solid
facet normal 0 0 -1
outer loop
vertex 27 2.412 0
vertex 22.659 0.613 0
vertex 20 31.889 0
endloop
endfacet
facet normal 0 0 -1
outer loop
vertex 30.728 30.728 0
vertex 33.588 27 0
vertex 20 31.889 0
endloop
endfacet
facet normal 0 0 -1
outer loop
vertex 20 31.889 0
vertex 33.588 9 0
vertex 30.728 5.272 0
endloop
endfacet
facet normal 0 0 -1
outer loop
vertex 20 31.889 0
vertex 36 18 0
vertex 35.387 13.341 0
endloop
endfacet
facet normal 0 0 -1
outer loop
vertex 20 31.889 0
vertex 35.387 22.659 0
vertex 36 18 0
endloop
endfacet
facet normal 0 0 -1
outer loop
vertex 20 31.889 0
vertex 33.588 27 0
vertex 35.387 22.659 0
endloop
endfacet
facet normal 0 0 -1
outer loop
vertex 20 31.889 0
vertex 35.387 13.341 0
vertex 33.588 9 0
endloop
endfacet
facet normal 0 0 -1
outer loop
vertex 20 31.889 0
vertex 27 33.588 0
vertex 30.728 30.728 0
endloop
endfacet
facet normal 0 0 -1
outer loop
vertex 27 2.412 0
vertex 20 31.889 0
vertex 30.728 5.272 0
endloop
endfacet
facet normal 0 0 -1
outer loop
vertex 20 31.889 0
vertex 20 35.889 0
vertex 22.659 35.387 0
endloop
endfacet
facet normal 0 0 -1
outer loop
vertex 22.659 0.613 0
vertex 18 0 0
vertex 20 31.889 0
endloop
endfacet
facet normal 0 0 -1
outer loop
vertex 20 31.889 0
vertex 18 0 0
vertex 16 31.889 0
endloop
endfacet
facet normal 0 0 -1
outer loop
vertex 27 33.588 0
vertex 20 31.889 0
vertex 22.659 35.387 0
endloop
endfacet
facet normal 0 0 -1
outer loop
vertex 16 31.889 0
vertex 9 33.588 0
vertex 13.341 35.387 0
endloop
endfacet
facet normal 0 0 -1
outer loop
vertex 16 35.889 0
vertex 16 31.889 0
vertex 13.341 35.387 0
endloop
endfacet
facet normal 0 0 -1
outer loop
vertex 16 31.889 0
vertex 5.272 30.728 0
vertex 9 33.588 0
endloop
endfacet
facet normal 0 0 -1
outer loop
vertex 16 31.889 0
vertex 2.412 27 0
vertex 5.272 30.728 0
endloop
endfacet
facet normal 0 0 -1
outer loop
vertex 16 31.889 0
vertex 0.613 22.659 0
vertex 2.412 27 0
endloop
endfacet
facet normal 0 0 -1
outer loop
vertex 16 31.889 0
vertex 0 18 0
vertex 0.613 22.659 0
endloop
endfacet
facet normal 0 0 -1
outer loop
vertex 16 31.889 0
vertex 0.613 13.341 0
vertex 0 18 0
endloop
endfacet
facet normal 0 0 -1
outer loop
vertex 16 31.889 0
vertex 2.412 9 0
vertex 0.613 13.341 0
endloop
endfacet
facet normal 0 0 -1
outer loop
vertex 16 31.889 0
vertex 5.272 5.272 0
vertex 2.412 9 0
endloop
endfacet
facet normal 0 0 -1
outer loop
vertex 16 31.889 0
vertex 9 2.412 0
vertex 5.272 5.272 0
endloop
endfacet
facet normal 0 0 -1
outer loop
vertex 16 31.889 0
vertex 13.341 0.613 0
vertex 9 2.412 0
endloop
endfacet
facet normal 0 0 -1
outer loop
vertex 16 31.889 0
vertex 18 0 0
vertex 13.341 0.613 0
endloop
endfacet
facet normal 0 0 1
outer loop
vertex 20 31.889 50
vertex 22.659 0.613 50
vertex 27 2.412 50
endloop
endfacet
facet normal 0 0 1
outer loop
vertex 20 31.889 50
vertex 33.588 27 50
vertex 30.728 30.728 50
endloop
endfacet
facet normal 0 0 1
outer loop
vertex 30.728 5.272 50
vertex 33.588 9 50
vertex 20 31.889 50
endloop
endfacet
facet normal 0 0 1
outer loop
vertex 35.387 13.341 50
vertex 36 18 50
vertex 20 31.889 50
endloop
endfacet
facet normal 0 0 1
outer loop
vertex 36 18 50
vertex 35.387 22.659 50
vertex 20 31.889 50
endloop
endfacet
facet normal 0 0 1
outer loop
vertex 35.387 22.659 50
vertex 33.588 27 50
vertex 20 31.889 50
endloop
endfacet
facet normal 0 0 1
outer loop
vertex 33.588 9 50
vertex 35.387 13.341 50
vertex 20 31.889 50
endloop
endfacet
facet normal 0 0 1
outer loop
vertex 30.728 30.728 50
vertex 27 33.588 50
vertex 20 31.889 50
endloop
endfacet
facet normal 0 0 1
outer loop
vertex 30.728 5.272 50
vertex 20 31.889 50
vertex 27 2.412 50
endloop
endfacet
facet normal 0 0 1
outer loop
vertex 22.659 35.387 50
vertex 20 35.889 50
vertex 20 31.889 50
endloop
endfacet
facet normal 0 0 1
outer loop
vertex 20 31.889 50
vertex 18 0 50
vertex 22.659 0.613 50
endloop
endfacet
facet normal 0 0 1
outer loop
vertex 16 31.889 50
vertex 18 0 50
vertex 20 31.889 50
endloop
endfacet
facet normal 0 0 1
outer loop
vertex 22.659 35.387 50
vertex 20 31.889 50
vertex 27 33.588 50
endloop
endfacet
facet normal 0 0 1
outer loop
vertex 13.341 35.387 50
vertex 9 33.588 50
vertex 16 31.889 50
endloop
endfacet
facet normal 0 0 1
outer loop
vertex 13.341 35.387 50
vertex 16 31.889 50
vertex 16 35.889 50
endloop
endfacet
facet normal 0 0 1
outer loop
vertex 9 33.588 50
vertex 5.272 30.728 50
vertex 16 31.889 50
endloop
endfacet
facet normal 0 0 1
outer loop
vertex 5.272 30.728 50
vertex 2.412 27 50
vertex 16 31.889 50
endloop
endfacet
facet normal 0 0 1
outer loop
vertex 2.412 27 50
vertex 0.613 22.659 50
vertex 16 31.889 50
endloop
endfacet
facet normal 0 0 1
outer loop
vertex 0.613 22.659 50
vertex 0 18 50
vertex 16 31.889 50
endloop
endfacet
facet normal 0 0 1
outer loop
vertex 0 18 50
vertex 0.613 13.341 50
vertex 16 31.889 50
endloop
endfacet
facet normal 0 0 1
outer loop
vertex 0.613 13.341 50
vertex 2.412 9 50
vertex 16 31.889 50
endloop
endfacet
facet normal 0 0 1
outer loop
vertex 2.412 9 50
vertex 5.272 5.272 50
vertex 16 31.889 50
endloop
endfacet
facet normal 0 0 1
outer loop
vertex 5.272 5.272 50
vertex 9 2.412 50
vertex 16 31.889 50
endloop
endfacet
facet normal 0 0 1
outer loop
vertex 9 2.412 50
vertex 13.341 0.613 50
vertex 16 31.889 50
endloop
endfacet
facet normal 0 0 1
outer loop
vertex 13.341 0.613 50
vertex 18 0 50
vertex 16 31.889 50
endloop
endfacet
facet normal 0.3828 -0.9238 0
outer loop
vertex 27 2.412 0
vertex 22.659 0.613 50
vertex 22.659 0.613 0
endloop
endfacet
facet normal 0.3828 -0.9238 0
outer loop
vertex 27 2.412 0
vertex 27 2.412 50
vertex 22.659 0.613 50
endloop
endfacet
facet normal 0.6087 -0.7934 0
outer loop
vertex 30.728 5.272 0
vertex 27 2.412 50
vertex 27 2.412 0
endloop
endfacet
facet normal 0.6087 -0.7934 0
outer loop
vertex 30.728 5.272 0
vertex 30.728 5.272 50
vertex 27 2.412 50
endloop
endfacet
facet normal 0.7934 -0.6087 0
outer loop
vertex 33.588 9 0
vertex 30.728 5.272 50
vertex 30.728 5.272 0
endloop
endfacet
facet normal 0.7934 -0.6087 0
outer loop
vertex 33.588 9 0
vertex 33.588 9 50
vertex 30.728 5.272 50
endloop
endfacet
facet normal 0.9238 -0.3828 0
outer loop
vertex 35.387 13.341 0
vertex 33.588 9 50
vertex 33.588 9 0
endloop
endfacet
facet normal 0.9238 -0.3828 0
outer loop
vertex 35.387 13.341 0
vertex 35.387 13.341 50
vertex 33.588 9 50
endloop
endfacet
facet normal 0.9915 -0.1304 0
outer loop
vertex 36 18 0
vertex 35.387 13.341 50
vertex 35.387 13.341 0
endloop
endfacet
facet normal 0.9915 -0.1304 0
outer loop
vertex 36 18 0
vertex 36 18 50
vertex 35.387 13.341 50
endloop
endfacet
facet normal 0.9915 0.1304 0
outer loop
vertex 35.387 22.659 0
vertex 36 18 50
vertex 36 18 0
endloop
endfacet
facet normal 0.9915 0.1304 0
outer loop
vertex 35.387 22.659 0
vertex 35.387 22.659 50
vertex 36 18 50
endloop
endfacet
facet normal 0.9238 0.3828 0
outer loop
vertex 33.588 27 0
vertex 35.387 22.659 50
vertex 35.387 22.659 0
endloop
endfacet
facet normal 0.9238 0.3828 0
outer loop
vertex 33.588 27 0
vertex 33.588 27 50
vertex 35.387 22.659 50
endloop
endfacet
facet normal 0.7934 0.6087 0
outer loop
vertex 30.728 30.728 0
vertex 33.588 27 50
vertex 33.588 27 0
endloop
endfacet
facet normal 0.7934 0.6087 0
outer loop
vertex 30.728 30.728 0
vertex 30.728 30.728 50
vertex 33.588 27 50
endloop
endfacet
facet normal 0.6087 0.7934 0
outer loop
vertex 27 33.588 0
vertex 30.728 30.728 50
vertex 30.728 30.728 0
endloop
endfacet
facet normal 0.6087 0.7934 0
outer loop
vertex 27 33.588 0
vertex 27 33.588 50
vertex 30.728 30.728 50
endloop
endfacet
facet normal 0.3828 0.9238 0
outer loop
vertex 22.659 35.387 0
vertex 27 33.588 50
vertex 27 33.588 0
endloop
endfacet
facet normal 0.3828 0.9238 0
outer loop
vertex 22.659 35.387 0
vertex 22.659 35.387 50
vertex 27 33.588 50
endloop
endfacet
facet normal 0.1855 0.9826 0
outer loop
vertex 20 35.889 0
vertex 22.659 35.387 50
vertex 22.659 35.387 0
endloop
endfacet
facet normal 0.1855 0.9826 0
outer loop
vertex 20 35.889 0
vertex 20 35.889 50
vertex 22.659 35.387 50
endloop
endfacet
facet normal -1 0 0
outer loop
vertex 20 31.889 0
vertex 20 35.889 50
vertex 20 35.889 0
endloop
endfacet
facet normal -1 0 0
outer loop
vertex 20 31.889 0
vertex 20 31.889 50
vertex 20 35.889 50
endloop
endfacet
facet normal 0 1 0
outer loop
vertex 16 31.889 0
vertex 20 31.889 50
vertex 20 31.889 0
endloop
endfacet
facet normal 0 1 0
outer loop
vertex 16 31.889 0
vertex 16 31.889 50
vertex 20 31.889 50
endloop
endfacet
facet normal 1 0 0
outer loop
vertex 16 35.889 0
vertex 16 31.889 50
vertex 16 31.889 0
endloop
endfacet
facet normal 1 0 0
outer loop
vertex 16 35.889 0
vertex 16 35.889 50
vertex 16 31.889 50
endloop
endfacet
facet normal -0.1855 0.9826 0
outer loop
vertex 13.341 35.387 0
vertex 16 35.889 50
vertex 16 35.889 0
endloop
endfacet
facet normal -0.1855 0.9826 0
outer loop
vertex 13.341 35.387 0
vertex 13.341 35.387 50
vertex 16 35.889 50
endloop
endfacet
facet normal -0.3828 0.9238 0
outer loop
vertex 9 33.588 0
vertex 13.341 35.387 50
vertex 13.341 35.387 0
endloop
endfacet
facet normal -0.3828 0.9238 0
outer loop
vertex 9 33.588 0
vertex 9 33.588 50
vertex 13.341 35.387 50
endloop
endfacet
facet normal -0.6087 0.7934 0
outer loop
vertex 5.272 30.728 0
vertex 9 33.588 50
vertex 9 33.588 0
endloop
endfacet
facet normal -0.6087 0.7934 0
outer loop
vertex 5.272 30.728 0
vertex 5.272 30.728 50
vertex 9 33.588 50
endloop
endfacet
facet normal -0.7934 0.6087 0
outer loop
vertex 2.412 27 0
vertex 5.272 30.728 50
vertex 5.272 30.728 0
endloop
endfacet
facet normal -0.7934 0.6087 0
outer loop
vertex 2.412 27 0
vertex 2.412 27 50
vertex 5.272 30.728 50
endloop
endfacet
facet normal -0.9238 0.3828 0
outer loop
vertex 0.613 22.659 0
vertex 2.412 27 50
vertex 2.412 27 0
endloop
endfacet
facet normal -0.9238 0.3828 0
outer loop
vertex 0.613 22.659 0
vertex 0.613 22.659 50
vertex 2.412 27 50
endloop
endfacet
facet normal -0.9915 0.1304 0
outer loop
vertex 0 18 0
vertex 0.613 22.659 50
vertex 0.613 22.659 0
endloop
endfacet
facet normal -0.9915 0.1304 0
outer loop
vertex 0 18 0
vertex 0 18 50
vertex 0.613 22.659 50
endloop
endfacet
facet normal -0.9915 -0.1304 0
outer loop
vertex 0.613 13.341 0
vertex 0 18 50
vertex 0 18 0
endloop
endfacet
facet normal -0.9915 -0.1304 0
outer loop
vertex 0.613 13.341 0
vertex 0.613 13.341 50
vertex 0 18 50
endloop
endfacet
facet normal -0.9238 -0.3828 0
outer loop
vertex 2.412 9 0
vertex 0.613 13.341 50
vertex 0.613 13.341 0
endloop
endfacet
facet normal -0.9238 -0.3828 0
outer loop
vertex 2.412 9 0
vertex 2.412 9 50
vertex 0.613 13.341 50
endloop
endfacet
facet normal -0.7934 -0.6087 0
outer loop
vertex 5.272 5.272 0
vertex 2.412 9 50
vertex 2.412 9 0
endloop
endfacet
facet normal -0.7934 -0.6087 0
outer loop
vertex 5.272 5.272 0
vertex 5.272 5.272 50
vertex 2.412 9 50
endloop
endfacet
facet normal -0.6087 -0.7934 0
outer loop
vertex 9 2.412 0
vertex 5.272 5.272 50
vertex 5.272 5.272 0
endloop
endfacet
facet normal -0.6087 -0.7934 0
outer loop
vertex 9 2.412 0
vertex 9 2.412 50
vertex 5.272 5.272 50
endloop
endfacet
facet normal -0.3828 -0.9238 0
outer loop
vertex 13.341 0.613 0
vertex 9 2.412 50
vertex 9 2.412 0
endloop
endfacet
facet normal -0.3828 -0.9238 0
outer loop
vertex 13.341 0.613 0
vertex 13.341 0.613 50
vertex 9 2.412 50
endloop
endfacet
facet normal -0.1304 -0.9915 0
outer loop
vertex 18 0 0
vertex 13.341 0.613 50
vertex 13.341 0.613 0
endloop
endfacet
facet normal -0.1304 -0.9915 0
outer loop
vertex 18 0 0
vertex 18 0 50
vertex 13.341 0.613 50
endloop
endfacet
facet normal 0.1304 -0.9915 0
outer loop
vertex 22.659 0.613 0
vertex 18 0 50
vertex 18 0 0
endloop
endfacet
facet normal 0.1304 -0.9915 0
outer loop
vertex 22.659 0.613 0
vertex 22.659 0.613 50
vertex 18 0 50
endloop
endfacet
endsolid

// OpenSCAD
$fn = 32;

// ----------------------------------------------------------------------
// Keyway shaft: d36 shaft, key 4 x 4 mm
// ----------------------------------------------------------------------

// --- parameters (mm) ---
shaft_r = 18;             // shaft radius
key_w = 4;                // keyway width
key_d = 4;                // keyway depth below the surface line
plate_t = 50;             // shaft length, Z (extrusion height)

shaft_d = 2 * shaft_r;  // shaft diameter
circle_step = 15;  // polygon sampling step, degrees

profile = [[13.341, 35.387], [9, 33.588], [5.272, 30.728], [2.412, 27], [0.613, 22.659], [0, 18], [0.613, 13.341], [2.412, 9], [5.272, 5.272], [9, 2.412], [13.341, 0.613], [18, 0], [22.659, 0.613], [27, 2.412], [30.728, 5.272], [33.588, 9], [35.387, 13.341], [36, 18], [35.387, 22.659], [33.588, 27], [30.728, 30.728], [27, 33.588], [22.659, 35.387], [20, 35.889], [20, 31.889], [16, 31.889], [16, 35.889]];  // primary outline, 27 points, counter clockwise

// --- the one profile operation ---
linear_extrude(height = plate_t) polygon(points = profile);
